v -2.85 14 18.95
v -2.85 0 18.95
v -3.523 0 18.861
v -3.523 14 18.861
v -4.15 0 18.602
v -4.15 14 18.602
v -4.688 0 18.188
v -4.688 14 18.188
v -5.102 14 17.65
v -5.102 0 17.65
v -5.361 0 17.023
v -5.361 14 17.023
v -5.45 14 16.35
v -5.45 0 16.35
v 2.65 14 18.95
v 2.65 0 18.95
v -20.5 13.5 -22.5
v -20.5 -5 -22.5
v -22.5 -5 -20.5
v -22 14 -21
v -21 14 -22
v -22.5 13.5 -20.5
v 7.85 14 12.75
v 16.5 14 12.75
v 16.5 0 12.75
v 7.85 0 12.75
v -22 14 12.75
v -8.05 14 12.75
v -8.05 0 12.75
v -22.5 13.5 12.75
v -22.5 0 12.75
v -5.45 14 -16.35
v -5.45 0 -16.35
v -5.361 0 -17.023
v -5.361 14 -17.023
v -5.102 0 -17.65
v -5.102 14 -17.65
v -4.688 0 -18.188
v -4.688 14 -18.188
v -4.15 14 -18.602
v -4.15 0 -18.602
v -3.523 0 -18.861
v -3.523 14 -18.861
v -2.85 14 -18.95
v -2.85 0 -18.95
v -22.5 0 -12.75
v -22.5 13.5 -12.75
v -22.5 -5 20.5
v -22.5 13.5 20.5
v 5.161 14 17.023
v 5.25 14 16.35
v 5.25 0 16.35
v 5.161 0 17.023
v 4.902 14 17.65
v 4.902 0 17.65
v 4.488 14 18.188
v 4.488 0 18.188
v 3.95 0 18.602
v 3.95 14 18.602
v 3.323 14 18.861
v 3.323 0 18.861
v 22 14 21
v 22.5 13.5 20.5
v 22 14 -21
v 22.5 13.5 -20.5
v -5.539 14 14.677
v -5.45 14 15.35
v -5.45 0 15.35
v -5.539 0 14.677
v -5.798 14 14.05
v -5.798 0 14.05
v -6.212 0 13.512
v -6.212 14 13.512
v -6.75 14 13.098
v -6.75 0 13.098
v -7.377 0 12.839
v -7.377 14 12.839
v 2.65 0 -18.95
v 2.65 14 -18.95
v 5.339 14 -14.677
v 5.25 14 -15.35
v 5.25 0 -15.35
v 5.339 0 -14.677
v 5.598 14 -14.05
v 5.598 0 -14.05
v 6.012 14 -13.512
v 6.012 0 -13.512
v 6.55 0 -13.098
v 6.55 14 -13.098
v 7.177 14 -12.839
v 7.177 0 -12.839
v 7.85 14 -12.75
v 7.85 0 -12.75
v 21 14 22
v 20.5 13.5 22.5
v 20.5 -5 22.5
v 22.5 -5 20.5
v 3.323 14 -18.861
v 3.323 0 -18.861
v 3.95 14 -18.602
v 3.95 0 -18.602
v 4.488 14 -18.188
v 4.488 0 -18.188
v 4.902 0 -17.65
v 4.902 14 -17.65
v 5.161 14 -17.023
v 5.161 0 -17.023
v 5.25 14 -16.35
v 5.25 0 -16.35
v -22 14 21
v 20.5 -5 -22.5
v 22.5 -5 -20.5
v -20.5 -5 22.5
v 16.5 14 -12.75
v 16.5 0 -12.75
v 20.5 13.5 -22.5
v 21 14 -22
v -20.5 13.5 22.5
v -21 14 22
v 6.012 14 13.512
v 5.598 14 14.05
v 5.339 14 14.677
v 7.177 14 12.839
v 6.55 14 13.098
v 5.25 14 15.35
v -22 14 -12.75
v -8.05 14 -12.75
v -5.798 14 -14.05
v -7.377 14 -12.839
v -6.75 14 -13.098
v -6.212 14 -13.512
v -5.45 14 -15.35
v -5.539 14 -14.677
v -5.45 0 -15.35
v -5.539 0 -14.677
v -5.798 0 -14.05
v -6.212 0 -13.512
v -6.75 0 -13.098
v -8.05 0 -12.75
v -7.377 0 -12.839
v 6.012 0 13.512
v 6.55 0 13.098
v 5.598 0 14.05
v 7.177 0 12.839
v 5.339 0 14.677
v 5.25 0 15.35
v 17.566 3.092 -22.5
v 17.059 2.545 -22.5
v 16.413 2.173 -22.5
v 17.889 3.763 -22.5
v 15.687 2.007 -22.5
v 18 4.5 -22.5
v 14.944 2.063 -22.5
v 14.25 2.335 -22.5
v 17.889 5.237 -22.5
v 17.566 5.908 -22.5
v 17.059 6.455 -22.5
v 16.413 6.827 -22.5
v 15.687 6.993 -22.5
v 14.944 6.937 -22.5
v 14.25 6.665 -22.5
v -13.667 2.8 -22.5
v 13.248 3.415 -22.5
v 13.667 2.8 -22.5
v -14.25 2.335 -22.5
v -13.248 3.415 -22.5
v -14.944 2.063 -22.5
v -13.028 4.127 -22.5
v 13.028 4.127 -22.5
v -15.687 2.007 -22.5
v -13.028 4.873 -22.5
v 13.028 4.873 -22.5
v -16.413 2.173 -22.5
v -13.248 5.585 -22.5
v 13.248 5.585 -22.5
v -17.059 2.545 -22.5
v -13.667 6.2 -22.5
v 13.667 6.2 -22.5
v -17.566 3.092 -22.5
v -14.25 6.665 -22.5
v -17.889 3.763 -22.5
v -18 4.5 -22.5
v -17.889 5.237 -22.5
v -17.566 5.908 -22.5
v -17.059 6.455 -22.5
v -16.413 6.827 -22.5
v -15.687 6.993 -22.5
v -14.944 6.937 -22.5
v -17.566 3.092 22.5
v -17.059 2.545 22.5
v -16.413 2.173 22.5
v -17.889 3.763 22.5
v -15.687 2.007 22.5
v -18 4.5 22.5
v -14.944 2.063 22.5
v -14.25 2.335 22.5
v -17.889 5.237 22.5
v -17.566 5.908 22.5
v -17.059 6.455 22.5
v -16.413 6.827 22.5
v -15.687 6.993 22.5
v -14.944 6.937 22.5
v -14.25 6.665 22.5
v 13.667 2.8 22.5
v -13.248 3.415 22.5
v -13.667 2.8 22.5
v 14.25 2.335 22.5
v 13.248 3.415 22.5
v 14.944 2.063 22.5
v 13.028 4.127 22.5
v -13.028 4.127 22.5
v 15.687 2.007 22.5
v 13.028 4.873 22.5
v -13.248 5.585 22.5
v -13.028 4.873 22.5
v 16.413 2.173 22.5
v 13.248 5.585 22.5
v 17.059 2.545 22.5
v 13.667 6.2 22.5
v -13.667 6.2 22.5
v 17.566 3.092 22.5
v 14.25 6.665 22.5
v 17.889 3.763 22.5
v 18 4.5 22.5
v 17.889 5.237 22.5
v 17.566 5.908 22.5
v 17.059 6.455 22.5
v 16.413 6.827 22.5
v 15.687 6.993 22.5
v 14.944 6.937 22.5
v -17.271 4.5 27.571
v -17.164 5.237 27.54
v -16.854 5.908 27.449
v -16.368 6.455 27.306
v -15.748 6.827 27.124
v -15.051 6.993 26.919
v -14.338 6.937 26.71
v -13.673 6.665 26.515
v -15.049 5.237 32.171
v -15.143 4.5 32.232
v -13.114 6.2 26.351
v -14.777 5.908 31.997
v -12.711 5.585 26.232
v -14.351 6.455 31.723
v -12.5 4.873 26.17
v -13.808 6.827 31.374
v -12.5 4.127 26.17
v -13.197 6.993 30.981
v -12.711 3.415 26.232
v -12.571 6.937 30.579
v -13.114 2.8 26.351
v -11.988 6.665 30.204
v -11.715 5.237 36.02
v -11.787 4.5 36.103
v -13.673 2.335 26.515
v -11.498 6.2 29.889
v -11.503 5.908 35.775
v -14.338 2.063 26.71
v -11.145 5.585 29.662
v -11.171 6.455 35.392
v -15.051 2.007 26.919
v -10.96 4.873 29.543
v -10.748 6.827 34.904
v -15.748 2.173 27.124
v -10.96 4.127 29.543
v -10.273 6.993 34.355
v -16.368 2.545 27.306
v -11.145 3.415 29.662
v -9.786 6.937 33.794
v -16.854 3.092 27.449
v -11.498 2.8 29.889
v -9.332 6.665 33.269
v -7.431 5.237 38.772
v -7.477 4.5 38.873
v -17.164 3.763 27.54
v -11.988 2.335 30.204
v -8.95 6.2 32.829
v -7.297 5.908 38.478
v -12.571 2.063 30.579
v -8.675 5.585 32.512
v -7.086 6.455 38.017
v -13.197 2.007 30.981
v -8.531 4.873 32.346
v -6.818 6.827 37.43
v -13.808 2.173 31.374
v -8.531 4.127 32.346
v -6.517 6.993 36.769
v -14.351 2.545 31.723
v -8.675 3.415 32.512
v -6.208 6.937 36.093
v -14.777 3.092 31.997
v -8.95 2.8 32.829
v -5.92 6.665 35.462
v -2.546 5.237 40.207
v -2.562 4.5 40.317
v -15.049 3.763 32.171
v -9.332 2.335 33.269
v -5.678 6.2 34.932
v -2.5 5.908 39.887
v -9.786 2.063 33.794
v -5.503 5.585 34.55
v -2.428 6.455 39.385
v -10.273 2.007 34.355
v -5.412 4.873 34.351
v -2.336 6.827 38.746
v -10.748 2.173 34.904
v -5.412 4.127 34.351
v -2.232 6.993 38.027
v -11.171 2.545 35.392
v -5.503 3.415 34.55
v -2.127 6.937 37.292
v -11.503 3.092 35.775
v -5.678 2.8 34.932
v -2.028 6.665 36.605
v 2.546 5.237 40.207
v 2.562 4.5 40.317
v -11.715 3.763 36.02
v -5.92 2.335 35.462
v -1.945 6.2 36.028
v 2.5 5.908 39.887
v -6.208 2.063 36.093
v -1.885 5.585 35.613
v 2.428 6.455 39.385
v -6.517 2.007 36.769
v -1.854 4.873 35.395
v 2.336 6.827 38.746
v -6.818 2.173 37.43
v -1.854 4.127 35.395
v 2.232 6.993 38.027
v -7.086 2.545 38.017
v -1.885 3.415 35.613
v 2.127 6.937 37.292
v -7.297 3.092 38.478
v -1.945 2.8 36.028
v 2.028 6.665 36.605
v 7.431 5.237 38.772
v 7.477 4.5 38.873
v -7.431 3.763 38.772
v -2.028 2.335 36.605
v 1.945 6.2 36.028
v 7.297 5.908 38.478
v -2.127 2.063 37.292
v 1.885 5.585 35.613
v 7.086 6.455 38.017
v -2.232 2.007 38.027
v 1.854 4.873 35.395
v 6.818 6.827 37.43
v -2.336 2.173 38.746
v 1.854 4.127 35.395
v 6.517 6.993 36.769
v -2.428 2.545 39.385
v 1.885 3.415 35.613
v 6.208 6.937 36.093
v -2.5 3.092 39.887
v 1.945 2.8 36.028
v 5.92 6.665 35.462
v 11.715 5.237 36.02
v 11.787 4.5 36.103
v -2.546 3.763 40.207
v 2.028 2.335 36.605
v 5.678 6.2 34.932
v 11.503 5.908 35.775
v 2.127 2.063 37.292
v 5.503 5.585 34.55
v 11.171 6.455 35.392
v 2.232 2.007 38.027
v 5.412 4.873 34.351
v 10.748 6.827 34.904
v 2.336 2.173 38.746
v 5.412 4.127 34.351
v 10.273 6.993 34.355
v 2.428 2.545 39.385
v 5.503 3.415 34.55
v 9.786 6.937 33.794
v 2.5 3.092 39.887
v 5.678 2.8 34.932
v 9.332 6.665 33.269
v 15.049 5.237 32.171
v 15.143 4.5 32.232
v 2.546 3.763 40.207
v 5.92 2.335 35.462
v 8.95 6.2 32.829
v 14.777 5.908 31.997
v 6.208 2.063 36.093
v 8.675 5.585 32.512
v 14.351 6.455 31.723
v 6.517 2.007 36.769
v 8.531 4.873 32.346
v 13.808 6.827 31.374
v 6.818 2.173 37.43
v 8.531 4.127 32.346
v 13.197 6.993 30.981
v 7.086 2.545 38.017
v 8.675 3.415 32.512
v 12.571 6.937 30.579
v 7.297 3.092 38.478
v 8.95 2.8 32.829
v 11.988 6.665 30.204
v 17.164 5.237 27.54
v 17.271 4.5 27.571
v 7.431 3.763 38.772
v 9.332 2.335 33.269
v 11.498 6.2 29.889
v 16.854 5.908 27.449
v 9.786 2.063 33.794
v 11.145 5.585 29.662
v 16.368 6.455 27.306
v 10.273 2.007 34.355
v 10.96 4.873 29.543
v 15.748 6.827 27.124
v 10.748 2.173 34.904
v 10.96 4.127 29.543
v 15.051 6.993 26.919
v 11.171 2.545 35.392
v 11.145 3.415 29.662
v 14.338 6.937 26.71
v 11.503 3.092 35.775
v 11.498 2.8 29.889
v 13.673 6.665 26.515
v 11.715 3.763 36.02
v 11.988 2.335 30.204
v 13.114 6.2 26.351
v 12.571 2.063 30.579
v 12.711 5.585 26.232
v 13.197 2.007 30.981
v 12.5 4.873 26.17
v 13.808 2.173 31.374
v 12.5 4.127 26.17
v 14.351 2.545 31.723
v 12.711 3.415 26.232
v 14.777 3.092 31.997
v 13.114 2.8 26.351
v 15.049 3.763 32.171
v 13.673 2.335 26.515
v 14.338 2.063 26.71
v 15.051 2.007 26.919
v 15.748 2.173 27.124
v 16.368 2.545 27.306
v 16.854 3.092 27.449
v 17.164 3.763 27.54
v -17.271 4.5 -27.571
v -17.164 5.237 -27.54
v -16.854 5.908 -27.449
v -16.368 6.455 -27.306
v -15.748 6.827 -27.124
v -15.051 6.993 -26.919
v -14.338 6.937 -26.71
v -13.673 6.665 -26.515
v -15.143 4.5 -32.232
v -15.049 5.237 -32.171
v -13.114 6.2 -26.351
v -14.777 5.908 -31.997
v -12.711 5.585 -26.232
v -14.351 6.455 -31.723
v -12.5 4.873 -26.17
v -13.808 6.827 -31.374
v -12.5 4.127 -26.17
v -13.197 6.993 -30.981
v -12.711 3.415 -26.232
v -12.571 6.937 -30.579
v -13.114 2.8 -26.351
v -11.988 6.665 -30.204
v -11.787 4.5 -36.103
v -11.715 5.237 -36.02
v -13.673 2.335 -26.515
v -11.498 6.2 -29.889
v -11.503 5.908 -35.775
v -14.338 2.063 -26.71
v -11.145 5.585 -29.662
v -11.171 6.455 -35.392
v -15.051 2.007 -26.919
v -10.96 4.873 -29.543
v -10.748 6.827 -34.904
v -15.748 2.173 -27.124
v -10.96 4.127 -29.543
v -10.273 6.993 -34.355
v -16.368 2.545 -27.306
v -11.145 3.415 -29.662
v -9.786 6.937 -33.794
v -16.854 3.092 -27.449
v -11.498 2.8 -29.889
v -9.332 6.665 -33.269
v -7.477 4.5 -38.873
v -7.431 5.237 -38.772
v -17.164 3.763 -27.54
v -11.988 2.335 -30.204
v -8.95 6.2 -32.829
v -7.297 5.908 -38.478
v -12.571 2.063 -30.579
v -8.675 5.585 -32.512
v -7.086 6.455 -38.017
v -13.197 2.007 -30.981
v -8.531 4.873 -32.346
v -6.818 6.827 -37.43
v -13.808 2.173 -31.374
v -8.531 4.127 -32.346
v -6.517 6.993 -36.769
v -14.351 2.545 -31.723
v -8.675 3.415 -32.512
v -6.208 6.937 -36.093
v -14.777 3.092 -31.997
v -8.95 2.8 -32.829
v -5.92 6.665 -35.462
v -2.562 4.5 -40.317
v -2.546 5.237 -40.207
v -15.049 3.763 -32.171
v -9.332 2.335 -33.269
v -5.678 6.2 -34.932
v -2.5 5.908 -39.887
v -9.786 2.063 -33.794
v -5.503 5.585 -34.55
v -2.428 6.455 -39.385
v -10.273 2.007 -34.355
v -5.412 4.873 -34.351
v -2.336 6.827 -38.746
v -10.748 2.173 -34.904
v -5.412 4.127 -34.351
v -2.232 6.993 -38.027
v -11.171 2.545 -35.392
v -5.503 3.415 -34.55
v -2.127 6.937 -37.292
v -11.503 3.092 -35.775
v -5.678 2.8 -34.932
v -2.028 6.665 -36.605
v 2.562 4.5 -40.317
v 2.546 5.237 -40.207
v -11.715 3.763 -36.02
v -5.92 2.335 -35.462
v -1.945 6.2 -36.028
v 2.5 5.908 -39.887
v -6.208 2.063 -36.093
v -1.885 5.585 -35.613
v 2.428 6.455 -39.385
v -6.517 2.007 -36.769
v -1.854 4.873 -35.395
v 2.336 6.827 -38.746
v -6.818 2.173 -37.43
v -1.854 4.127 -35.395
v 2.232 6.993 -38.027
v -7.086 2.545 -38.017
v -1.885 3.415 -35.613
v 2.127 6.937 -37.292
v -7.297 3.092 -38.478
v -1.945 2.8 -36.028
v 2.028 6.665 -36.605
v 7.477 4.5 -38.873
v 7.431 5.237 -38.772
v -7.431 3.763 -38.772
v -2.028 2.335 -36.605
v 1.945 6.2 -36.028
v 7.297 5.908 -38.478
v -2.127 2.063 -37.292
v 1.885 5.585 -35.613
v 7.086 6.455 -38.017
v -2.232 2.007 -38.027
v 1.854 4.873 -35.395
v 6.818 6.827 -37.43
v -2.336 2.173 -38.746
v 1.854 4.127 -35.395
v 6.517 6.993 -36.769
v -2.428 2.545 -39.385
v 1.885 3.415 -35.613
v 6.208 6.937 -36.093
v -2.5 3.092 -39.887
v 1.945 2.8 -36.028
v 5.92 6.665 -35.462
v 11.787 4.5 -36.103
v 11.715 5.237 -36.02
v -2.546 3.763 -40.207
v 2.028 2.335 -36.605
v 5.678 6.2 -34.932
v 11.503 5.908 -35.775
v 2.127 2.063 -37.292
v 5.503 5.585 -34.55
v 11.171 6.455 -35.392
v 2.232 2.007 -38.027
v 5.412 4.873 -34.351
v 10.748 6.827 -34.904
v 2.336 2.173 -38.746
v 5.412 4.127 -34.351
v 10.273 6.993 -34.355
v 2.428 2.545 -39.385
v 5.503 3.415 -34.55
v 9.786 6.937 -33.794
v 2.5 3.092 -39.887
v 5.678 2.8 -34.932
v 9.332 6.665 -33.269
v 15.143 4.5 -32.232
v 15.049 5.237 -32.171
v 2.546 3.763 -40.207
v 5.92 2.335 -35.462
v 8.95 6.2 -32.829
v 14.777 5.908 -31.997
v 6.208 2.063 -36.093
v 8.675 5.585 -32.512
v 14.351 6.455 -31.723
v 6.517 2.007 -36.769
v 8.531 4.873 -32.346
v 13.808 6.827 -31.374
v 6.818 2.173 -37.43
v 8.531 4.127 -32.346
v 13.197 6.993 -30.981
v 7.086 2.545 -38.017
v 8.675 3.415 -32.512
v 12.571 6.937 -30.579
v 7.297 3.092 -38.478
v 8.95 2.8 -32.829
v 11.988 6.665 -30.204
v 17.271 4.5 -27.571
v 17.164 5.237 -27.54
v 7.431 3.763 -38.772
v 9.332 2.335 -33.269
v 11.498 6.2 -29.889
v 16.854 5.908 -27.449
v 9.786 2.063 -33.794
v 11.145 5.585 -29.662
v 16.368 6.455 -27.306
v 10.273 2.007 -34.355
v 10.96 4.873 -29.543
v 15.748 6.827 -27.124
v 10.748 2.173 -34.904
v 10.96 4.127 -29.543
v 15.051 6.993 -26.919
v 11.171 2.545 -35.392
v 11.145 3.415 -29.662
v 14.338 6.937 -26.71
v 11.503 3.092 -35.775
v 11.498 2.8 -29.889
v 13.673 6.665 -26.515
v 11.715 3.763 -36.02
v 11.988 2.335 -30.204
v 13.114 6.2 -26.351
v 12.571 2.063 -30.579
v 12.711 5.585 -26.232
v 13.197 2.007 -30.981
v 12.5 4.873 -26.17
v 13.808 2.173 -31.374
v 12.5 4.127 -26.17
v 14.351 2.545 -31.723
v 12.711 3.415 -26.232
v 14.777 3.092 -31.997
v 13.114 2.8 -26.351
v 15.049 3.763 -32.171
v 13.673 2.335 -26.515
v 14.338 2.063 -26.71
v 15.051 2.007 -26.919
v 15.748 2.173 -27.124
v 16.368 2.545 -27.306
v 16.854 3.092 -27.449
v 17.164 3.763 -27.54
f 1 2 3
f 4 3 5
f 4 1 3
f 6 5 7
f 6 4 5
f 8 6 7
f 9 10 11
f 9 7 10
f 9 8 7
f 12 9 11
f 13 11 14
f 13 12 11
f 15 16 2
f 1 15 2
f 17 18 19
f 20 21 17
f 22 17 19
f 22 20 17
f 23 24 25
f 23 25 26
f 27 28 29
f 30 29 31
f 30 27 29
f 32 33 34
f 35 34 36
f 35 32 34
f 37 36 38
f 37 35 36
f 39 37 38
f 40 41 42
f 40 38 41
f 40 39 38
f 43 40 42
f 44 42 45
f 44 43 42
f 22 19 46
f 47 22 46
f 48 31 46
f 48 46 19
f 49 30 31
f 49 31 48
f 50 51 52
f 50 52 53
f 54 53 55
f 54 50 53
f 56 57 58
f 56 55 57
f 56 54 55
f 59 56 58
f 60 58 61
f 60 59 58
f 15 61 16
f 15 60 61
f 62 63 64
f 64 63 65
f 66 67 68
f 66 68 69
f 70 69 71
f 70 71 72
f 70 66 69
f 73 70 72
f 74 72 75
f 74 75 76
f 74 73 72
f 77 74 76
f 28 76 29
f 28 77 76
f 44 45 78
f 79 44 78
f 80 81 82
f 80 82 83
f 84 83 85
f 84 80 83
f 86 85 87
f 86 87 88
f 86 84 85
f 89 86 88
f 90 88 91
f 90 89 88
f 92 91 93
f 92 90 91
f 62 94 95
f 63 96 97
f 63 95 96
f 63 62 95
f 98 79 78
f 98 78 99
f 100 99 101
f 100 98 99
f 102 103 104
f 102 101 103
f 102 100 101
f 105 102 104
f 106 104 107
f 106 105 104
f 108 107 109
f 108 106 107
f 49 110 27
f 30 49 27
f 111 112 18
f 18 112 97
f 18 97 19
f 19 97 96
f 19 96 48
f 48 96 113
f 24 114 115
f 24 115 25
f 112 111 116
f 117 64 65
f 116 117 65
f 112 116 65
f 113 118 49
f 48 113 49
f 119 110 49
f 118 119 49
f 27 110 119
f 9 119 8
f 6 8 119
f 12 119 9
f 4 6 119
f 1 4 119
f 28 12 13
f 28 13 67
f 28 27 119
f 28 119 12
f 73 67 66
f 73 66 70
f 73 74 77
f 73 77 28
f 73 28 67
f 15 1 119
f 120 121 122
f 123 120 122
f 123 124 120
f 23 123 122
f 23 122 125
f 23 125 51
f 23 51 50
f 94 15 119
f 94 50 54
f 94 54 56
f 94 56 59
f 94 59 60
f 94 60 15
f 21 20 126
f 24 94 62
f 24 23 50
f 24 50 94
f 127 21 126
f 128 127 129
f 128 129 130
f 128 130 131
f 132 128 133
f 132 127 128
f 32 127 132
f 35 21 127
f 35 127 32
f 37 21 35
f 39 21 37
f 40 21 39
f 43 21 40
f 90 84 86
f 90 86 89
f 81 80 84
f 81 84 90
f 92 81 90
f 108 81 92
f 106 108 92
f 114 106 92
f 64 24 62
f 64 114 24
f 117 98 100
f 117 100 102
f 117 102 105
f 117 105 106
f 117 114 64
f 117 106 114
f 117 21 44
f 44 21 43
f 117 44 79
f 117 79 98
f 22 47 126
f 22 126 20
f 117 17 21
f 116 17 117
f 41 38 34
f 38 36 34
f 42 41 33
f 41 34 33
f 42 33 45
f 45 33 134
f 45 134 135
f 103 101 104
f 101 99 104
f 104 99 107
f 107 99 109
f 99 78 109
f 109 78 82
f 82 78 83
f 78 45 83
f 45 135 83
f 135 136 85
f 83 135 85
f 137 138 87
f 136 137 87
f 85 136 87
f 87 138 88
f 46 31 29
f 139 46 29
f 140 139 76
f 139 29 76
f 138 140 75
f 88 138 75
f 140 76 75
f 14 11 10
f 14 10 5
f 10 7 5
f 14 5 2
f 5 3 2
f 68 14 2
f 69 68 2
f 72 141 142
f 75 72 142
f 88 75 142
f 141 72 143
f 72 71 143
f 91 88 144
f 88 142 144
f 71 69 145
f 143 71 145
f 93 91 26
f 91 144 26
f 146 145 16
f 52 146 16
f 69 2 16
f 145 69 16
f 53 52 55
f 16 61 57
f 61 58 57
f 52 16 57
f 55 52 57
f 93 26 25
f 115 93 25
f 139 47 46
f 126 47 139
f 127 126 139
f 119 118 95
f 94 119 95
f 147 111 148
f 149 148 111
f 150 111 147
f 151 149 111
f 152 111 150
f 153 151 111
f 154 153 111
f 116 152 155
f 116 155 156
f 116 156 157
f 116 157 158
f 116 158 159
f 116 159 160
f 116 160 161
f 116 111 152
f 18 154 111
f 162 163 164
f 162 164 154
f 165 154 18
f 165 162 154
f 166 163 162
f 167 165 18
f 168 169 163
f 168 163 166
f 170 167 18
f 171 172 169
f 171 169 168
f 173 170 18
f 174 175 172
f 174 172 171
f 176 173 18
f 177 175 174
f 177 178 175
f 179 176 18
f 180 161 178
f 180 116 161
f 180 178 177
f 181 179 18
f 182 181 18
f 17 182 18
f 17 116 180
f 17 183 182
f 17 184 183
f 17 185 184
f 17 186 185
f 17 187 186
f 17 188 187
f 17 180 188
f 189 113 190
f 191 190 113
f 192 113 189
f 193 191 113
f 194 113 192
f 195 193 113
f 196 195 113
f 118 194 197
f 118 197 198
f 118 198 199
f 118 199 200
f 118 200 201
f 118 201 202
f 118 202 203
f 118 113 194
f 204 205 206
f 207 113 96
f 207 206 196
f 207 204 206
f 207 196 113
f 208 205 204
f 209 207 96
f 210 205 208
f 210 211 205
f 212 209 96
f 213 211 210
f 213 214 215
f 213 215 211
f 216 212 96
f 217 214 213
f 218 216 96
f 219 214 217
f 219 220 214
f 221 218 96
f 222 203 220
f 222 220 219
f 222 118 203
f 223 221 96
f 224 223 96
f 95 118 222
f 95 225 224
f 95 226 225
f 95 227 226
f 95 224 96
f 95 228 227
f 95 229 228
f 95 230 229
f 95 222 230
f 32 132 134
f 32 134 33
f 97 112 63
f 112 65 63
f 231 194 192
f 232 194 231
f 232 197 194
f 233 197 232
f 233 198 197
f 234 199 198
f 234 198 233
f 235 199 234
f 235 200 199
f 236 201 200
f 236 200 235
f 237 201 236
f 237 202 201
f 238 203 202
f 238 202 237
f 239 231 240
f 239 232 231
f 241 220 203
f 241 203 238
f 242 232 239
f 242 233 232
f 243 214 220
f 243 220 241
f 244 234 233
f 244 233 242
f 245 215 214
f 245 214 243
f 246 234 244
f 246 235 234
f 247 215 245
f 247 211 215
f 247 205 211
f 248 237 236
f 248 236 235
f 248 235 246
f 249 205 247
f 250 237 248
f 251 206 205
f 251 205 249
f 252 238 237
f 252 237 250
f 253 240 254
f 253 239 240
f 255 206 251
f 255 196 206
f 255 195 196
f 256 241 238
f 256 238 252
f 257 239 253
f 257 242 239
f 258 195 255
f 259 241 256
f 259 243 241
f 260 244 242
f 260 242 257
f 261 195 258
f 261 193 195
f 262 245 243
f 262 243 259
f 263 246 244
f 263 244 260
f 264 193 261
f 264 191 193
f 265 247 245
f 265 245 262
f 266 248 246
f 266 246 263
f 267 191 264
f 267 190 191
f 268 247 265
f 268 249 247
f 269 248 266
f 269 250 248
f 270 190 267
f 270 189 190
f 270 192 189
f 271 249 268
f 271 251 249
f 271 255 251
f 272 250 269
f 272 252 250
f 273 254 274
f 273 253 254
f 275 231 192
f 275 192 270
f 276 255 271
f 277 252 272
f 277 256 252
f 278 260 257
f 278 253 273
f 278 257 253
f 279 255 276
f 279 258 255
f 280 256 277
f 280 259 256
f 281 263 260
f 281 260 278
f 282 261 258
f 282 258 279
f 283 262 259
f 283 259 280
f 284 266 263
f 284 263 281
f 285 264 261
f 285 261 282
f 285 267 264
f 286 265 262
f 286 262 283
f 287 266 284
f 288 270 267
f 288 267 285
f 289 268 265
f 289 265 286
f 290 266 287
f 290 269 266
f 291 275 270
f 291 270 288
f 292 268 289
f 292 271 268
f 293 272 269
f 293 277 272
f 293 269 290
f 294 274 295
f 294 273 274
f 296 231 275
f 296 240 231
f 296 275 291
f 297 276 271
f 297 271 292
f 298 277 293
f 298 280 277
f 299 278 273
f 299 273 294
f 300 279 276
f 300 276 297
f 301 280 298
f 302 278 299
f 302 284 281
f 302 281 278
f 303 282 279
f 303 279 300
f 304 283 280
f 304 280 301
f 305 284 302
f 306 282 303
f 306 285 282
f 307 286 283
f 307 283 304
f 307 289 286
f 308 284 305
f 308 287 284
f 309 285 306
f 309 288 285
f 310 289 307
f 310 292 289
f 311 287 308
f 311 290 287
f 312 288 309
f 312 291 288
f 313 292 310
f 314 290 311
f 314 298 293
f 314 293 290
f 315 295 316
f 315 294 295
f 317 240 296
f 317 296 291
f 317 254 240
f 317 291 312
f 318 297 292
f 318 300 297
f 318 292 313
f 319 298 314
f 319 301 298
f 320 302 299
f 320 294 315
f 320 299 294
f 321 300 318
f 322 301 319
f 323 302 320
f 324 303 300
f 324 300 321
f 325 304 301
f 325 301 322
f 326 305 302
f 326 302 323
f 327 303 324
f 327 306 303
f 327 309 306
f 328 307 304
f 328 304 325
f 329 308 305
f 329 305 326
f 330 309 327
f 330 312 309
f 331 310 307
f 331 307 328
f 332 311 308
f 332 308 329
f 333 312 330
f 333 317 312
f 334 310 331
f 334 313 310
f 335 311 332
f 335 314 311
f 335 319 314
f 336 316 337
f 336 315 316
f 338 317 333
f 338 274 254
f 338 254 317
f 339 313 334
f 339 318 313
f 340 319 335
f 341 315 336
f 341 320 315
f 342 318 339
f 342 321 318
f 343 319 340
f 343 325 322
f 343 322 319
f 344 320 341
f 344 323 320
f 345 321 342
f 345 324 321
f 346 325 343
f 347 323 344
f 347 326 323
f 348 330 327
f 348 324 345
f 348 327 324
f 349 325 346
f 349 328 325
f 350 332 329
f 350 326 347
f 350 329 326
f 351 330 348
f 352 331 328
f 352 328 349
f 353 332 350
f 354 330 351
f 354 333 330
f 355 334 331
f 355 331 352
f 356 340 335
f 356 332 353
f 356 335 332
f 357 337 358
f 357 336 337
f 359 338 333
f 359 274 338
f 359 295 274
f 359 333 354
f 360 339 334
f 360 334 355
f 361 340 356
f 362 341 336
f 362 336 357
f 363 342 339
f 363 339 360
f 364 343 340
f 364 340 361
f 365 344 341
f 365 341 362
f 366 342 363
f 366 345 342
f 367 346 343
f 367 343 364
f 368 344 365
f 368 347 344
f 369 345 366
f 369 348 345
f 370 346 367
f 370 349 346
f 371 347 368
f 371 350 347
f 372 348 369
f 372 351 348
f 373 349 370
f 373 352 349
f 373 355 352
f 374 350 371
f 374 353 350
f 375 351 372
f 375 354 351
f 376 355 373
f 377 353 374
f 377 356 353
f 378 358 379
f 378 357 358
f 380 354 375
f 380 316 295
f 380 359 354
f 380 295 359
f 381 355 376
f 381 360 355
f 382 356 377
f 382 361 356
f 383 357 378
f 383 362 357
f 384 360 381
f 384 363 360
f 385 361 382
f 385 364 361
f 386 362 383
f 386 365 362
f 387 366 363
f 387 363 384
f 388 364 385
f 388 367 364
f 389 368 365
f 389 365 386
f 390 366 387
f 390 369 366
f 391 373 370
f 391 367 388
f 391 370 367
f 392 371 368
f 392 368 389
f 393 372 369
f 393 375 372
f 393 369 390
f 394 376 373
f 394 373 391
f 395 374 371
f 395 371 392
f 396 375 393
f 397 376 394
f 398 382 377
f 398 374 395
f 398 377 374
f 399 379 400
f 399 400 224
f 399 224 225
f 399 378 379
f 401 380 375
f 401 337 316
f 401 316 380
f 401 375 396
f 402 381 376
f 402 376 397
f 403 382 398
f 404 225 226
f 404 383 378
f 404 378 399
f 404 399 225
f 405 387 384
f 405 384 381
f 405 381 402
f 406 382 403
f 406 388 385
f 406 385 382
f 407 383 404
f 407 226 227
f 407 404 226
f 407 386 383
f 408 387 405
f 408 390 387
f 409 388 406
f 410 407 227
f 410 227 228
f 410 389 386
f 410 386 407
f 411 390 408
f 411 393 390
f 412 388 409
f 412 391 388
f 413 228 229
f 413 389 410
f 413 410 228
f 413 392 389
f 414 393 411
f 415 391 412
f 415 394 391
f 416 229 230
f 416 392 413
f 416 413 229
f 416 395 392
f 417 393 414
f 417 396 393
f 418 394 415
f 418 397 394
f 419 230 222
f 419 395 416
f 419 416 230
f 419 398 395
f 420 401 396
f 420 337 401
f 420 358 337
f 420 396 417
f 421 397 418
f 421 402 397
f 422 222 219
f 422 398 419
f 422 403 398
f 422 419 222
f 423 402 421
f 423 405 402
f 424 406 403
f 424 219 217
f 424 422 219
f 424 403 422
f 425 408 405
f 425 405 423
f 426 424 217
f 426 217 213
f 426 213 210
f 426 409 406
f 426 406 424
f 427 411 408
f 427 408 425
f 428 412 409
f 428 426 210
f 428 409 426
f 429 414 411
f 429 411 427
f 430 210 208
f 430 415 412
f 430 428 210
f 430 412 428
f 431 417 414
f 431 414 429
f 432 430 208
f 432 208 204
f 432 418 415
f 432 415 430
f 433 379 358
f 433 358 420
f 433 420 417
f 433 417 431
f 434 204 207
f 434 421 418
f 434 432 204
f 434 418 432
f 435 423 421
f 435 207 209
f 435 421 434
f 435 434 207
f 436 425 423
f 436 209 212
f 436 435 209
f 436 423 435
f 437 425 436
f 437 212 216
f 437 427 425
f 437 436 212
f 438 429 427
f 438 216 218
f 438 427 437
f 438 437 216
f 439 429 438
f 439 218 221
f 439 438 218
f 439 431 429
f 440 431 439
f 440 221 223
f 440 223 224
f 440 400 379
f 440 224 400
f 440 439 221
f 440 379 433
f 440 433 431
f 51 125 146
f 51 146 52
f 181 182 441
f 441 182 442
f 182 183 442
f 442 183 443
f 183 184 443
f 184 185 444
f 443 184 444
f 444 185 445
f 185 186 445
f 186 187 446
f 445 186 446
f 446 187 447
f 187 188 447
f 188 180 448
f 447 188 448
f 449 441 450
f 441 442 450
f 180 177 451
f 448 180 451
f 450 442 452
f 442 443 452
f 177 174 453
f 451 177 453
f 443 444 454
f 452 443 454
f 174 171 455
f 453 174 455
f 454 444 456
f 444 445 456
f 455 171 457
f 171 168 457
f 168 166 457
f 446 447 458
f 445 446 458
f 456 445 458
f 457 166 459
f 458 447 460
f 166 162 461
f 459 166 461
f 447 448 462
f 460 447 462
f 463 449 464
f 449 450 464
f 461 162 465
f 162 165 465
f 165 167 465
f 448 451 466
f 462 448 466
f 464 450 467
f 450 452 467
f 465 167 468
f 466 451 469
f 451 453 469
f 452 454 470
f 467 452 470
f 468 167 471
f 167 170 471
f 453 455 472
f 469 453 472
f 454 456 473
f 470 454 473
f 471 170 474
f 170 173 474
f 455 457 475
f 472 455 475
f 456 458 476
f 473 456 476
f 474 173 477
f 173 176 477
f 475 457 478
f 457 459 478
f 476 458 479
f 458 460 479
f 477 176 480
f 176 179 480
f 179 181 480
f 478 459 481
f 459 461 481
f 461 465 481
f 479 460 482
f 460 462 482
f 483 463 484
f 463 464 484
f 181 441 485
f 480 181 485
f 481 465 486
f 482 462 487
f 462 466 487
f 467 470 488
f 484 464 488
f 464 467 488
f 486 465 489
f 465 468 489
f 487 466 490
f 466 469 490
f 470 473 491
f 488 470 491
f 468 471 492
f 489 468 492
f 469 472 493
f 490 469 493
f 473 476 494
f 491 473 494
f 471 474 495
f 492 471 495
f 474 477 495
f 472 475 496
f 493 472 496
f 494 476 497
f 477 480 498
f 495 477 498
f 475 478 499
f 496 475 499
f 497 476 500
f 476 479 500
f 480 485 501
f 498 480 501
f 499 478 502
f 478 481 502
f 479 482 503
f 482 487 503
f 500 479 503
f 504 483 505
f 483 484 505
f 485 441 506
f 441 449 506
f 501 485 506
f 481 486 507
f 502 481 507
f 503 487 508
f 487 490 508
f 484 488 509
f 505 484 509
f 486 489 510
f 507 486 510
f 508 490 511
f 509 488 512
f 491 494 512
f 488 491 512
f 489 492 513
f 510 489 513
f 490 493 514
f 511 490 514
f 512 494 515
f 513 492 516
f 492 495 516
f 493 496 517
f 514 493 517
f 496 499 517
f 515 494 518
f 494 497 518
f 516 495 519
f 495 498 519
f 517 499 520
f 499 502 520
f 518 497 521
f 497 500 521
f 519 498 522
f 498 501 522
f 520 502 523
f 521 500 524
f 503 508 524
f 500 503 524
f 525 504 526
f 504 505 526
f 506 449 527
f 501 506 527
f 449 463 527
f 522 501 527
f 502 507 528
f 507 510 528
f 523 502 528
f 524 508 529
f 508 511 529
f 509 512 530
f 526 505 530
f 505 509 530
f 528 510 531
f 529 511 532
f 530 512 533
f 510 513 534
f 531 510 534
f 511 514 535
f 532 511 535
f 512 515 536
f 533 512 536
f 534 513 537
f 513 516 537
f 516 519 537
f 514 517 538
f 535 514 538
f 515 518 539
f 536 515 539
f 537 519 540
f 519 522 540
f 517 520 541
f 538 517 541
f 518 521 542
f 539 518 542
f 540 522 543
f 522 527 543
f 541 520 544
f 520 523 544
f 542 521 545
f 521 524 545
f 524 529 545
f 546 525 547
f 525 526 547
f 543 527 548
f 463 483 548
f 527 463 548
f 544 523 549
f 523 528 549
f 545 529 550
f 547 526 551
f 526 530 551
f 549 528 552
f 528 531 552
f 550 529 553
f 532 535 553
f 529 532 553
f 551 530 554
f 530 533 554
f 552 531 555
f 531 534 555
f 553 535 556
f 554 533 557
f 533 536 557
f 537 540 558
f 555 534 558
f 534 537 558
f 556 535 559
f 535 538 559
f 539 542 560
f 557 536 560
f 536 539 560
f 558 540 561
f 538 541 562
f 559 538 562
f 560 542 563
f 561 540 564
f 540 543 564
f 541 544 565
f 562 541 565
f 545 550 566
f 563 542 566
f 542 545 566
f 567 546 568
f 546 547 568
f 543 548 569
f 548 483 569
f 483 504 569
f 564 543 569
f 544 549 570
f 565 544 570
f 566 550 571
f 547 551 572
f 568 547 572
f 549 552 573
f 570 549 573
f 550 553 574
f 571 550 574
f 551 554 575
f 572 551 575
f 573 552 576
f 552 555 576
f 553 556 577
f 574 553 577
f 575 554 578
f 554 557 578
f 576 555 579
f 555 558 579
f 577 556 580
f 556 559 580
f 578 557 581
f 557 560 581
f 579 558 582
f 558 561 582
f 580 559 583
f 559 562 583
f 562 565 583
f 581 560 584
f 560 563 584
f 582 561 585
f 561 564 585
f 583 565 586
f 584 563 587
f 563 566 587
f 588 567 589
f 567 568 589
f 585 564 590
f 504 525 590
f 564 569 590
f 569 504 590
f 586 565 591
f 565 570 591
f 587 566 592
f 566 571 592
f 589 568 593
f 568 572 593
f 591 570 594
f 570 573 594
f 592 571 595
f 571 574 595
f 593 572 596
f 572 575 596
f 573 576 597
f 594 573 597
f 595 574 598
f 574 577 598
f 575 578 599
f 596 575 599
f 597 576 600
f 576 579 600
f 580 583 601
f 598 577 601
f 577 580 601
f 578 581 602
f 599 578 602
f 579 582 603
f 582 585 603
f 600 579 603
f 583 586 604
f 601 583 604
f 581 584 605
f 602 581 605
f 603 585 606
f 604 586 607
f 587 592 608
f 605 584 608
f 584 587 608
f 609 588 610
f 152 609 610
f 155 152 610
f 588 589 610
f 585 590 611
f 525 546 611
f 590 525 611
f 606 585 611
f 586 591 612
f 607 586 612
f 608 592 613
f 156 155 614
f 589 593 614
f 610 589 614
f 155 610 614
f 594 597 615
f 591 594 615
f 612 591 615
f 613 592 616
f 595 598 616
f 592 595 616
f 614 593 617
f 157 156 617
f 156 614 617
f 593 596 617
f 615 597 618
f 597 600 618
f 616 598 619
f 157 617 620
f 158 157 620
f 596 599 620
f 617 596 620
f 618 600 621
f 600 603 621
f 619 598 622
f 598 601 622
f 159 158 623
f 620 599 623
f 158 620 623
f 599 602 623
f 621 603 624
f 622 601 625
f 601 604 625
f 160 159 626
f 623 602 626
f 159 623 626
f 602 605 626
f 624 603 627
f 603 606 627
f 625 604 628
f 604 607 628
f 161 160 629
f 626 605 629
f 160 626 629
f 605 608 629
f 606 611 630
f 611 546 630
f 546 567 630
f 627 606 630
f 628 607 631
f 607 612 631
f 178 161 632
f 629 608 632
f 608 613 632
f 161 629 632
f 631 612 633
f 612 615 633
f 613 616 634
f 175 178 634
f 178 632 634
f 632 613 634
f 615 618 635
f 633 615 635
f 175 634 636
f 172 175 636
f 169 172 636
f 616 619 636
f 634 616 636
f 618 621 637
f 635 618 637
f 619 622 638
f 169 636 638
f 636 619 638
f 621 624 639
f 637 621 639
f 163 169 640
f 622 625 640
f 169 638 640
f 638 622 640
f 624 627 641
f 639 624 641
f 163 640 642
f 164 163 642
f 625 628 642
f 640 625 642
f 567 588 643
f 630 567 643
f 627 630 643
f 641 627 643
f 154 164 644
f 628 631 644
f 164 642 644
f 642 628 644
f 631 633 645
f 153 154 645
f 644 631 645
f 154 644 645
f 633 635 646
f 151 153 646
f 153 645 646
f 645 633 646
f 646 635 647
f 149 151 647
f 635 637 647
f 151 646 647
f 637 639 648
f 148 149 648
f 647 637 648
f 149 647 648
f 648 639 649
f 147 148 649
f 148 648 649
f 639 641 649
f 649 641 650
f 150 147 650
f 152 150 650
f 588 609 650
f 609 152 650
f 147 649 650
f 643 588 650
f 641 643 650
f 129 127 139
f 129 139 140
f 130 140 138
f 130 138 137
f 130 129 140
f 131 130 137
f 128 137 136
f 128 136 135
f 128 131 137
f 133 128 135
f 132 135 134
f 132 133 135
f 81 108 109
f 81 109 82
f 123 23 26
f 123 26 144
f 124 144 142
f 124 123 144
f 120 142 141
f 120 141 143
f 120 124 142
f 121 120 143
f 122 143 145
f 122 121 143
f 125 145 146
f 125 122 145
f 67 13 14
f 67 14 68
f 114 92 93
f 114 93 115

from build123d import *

# Parameters (mm, degrees)
SKETCH1_W           = 45
SKETCH1_H           = 45
BOSS_EXTRUDE1_DEPTH = 14
CUT_EXTRUDE1_DEPTH  = 35.763486592
CHAMFER1_SIZE       = 0.5
CHAMFER2_SIZE       = 2
SKETCH4_R           = 1.75
CUT_EXTRUDE2_DEPTH  = 35.763486592
SKETCH5_R           = 1.75
SKETCH5_W           = 41
SKETCH5_H           = 2
SKETCH5_W_2         = 2
SKETCH5_H_2         = 41
BOSS_EXTRUDE3_DEPTH = 5
SKETCH6_R           = 1.75
BOSS_EXTRUDE4_DEPTH = 19
REVOLVE4_OUTLINE_R  = 2.5
REVOLVE4_ANGLE      = 180


# Read off the part's stored shape, not the designer's step: Revolve4
with BuildPart() as part:
    # Sketch1 → Boss-Extrude1 (new body)
    with BuildSketch(Plane(origin=(0, 0, 0), x_dir=(1, 0, 0), z_dir=(0, 1, 0))):
        Rectangle(SKETCH1_W, SKETCH1_H)
    extrude(amount=BOSS_EXTRUDE1_DEPTH)

    # Sketch3 → Cut-Extrude1 (cut, through all)
    with BuildSketch(Plane(origin=(0, 14, 0), x_dir=(1, 0, 0), z_dir=(0, 1, 0))):
        with BuildLine():
            Line((-22.5, 12.75), (-8.05, 12.75))
            ThreePointArc((-8.05, 12.75), (-6.211522369, 13.511522369), (-5.45, 15.35))
            Line((-5.45, 15.35), (-5.45, 16.35))
            ThreePointArc((-5.45, 16.35), (-4.688477631, 18.188477631), (-2.85, 18.95))
            Line((-2.85, 18.95), (2.65, 18.95))
            ThreePointArc((2.65, 18.95), (4.488477631, 18.188477631), (5.25, 16.35))
            Line((5.25, 16.35), (5.25, 15.35))
            ThreePointArc((5.25, 15.35), (6.011522369, 13.511522369), (7.85, 12.75))
            Line((7.85, 12.75), (16.5, 12.75))
            Line((16.5, 12.75), (16.5, -12.75))
            Line((16.5, -12.75), (7.85, -12.75))
            ThreePointArc((7.85, -12.75), (6.011522369, -13.511522369), (5.25, -15.35))
            Line((5.25, -15.35), (5.25, -16.35))
            ThreePointArc((5.25, -16.35), (4.488477631, -18.188477631), (2.65, -18.95))
            Line((2.65, -18.95), (-2.85, -18.95))
            ThreePointArc((-2.85, -18.95), (-4.688477631, -18.188477631), (-5.45, -16.35))
            Line((-5.45, -16.35), (-5.45, -15.35))
            ThreePointArc((-5.45, -15.35), (-6.211522369, -13.511522369), (-8.05, -12.75))
            Line((-8.05, -12.75), (-22.5, -12.75))
            Line((-22.5, -12.75), (-22.5, 12.75))
        make_face()
    extrude(amount=-CUT_EXTRUDE1_DEPTH, mode=Mode.SUBTRACT)

    # Chamfer1
    chamfer1_edges = [part.edges().sort_by_distance(p)[0] for p in [
        (-22.5, 14, -17.625),
        (0, 14, 22.5),
        (-22.5, 14, 17.625),
        (22.5, 14, 0),
        (0, 14, -22.5),
    ]]
    chamfer(chamfer1_edges, length=CHAMFER1_SIZE)

    # Chamfer2
    # the kernel refuses this chamfer: 5.464101615, 2 mm, written as the material it takes off along each edge
    # the kernel refuses this chamfer: 5.464101615, 2 mm, written as the material it takes off along each edge
    with BuildSketch(Plane(origin=(-22.5, -5.143365976, -22.5), x_dir=(-0.027495876610585647, 0, 0.9996219169112968), z_dir=(0, 1, 0)), Plane(origin=(-22.5, -5.143365976, 22.5), x_dir=(0.9996219169112968, 0, 0.027495876610585647), z_dir=(0, 1, 0))) as chamfer2_2_piece_1:
        Polygon((CHAMFER2_SIZE * 0.999621916911, CHAMFER2_SIZE * 0.0274958766106), (-CHAMFER2_SIZE * 0.0274958766106, CHAMFER2_SIZE * 0.999621916911), (0, 0), align=None)
    extrude(amount=23.786731952, mode=Mode.SUBTRACT)
    with BuildSketch(Plane(origin=(22.5, -5.143365976, 22.5), x_dir=(-0.9996219169112968, 0, 0.027495876610585647), z_dir=(0, 1, 0)), Plane(origin=(22.5, -5.143365976, -22.5), x_dir=(0.027495876610585647, 0, 0.9996219169112968), z_dir=(0, 1, 0))) as chamfer2_2_piece_2:
        Polygon((CHAMFER2_SIZE * 0.999621916911, -CHAMFER2_SIZE * 0.0274958766106), (-CHAMFER2_SIZE * 0.0274958766106, -CHAMFER2_SIZE * 0.999621916911), (0, 0), align=None)
    extrude(amount=23.786731952, mode=Mode.SUBTRACT)

    # Sketch4 → Cut-Extrude2 (cut, through all)
    with BuildSketch(Plane(origin=(0, 14, 0), x_dir=(1, 0, 0), z_dir=(0, 1, 0))):
        with Locations(Location((-18, 17.25, 0), (0, 0, 270))):
            Circle(SKETCH4_R)
        with Locations(Location((18, 17.25, 0), (0, 0, 270))):
            Circle(SKETCH4_R)
        with Locations(Location((18, -17.25, 0), (0, 0, 270))):
            Circle(SKETCH4_R)
        with Locations(Location((-18, -17.25, 0), (0, 0, 270))):
            Circle(SKETCH4_R)
    extrude(amount=-CUT_EXTRUDE2_DEPTH, mode=Mode.SUBTRACT)

    # Sketch5 → Boss-Extrude3 (add)
    # profile 1 of 7: a face of its own
    with BuildSketch(Plane.XZ):
        with BuildLine():
            Line((20.5, 20.5), (20.5, -22.5))
            Line((20.5, -22.5), (-20.5, -22.5))
            Line((-20.5, -22.5), (-22.5, -20.5))
            Line((-22.5, -20.5), (-22.5, -12.75))
            Line((-22.5, -12.75), (-8.05, -12.75))
            ThreePointArc((-8.05, -12.75), (-6.211522369, -13.511522369), (-5.45, -15.35))
            Line((-5.45, -15.35), (-5.45, -16.35))
            ThreePointArc((-5.45, -16.35), (-4.688477631, -18.188477631), (-2.85, -18.95))
            Line((-2.85, -18.95), (2.65, -18.95))
            ThreePointArc((2.65, -18.95), (4.488477631, -18.188477631), (5.25, -16.35))
            Line((5.25, -16.35), (5.25, -15.35))
            ThreePointArc((5.25, -15.35), (6.011522369, -13.511522369), (7.85, -12.75))
            Line((7.85, -12.75), (16.5, -12.75))
            Line((16.5, -12.75), (16.5, 12.75))
            Line((16.5, 12.75), (7.85, 12.75))
            ThreePointArc((7.85, 12.75), (6.011522369, 13.511522369), (5.25, 15.35))
            Line((5.25, 15.35), (5.25, 16.35))
            ThreePointArc((5.25, 16.35), (4.488477631, 18.188477631), (2.65, 18.95))
            Line((2.65, 18.95), (-2.85, 18.95))
            ThreePointArc((-2.85, 18.95), (-4.688477631, 18.188477631), (-5.45, 16.35))
            Line((-5.45, 16.35), (-5.45, 15.35))
            ThreePointArc((-5.45, 15.35), (-6.211522369, 13.511522369), (-8.05, 12.75))
            Line((-8.05, 12.75), (-22.5, 12.75))
            Line((-22.5, 12.75), (-22.5, 20.5))
            Line((-22.5, 20.5), (20.5, 20.5))
        make_face()
        with Locations(Location((18, 17.25, 0), (0, 0, 90))):
            Circle(SKETCH5_R, mode=Mode.SUBTRACT)
        with Locations(Location((-18, -17.25, 0), (0, 0, 90))):
            Circle(SKETCH5_R, mode=Mode.SUBTRACT)
        with Locations(Location((18, -17.25, 0), (0, 0, 90))):
            Circle(SKETCH5_R, mode=Mode.SUBTRACT)
        with Locations(Location((-18, 17.25, 0), (0, 0, 90))):
            Circle(SKETCH5_R, mode=Mode.SUBTRACT)
    # profile 2 of 7: a face of its own
    with BuildSketch(Plane.XZ):
        with Locations((0, 21.5)):
            Rectangle(SKETCH5_W, SKETCH5_H)
    # profile 3 of 7: a face of its own
    with BuildSketch(Plane.XZ):
        Polygon((-22.5, 20.5), (-20.5, 20.5), (-20.5, 22.5), align=None)
    # profile 4 of 7: a face of its own
    with BuildSketch(Plane.XZ):
        Polygon((22.5, 20.5), (20.5, 20.5), (20.5, 22.5), align=None)
    # profile 5 of 7: a face of its own
    with BuildSketch(Plane.XZ):
        with Locations((21.5, 0)):
            Rectangle(SKETCH5_W_2, SKETCH5_H_2)
    # profile 6 of 7: a face of its own
    with BuildSketch(Plane.XZ):
        Polygon((20.5, -20.5), (20.5, -22.5), (22.5, -20.5), align=None)
    # profile 7 of 7: a face of its own
    with BuildSketch(Plane.XZ):
        with BuildLine():
            Line((-22.5, 12.75), (-22.5, -12.75))
            Line((-22.5, -12.75), (-8.05, -12.75))
            ThreePointArc((-8.05, -12.75), (-6.211522369, -13.511522369), (-5.45, -15.35))
            Line((-5.45, -15.35), (-5.45, -16.35))
            ThreePointArc((-5.45, -16.35), (-4.688477631, -18.188477631), (-2.85, -18.95))
            Line((-2.85, -18.95), (2.65, -18.95))
            ThreePointArc((2.65, -18.95), (4.488477631, -18.188477631), (5.25, -16.35))
            Line((5.25, -16.35), (5.25, -15.35))
            ThreePointArc((5.25, -15.35), (6.011522369, -13.511522369), (7.85, -12.75))
            Line((7.85, -12.75), (16.5, -12.75))
            Line((16.5, -12.75), (16.5, 12.75))
            Line((16.5, 12.75), (7.85, 12.75))
            ThreePointArc((7.85, 12.75), (6.011522369, 13.511522369), (5.25, 15.35))
            Line((5.25, 15.35), (5.25, 16.35))
            ThreePointArc((5.25, 16.35), (4.488477631, 18.188477631), (2.65, 18.95))
            Line((2.65, 18.95), (-2.85, 18.95))
            ThreePointArc((-2.85, 18.95), (-4.688477631, 18.188477631), (-5.45, 16.35))
            Line((-5.45, 16.35), (-5.45, 15.35))
            ThreePointArc((-5.45, 15.35), (-6.211522369, 13.511522369), (-8.05, 12.75))
            Line((-8.05, 12.75), (-22.5, 12.75))
        make_face()
    extrude(amount=BOSS_EXTRUDE3_DEPTH)

    # Sketch6 → Boss-Extrude4 (add)
    with BuildSketch(Plane(origin=(0, 14, 0), x_dir=(1, 0, 0), z_dir=(0, 1, 0))):
        with Locations((-18, 17.25)):
            Circle(SKETCH6_R)
        with Locations((18, 17.25)):
            Circle(SKETCH6_R)
        with Locations((-18, -17.25)):
            Circle(SKETCH6_R)
        with Locations((18, -17.25)):
            Circle(SKETCH6_R)
    extrude(amount=-BOSS_EXTRUDE4_DEPTH)

    # Revolve4 outline → Revolve4 (revolve)
    with BuildSketch(Plane(origin=(0, 0, 22.5), x_dir=(-1, 0, 0), z_dir=(0, 0, -1))):
        with Locations((15.5, 4.5)):
            Circle(REVOLVE4_OUTLINE_R)
    revolve4 = revolve(axis=Axis((0, 0, 22.5), (0, 1, 0)), revolution_arc=REVOLVE4_ANGLE)

    # Mirror1: Revolve4 across plane
    add(revolve4.mirror(Plane.XY))


solid = part.part
